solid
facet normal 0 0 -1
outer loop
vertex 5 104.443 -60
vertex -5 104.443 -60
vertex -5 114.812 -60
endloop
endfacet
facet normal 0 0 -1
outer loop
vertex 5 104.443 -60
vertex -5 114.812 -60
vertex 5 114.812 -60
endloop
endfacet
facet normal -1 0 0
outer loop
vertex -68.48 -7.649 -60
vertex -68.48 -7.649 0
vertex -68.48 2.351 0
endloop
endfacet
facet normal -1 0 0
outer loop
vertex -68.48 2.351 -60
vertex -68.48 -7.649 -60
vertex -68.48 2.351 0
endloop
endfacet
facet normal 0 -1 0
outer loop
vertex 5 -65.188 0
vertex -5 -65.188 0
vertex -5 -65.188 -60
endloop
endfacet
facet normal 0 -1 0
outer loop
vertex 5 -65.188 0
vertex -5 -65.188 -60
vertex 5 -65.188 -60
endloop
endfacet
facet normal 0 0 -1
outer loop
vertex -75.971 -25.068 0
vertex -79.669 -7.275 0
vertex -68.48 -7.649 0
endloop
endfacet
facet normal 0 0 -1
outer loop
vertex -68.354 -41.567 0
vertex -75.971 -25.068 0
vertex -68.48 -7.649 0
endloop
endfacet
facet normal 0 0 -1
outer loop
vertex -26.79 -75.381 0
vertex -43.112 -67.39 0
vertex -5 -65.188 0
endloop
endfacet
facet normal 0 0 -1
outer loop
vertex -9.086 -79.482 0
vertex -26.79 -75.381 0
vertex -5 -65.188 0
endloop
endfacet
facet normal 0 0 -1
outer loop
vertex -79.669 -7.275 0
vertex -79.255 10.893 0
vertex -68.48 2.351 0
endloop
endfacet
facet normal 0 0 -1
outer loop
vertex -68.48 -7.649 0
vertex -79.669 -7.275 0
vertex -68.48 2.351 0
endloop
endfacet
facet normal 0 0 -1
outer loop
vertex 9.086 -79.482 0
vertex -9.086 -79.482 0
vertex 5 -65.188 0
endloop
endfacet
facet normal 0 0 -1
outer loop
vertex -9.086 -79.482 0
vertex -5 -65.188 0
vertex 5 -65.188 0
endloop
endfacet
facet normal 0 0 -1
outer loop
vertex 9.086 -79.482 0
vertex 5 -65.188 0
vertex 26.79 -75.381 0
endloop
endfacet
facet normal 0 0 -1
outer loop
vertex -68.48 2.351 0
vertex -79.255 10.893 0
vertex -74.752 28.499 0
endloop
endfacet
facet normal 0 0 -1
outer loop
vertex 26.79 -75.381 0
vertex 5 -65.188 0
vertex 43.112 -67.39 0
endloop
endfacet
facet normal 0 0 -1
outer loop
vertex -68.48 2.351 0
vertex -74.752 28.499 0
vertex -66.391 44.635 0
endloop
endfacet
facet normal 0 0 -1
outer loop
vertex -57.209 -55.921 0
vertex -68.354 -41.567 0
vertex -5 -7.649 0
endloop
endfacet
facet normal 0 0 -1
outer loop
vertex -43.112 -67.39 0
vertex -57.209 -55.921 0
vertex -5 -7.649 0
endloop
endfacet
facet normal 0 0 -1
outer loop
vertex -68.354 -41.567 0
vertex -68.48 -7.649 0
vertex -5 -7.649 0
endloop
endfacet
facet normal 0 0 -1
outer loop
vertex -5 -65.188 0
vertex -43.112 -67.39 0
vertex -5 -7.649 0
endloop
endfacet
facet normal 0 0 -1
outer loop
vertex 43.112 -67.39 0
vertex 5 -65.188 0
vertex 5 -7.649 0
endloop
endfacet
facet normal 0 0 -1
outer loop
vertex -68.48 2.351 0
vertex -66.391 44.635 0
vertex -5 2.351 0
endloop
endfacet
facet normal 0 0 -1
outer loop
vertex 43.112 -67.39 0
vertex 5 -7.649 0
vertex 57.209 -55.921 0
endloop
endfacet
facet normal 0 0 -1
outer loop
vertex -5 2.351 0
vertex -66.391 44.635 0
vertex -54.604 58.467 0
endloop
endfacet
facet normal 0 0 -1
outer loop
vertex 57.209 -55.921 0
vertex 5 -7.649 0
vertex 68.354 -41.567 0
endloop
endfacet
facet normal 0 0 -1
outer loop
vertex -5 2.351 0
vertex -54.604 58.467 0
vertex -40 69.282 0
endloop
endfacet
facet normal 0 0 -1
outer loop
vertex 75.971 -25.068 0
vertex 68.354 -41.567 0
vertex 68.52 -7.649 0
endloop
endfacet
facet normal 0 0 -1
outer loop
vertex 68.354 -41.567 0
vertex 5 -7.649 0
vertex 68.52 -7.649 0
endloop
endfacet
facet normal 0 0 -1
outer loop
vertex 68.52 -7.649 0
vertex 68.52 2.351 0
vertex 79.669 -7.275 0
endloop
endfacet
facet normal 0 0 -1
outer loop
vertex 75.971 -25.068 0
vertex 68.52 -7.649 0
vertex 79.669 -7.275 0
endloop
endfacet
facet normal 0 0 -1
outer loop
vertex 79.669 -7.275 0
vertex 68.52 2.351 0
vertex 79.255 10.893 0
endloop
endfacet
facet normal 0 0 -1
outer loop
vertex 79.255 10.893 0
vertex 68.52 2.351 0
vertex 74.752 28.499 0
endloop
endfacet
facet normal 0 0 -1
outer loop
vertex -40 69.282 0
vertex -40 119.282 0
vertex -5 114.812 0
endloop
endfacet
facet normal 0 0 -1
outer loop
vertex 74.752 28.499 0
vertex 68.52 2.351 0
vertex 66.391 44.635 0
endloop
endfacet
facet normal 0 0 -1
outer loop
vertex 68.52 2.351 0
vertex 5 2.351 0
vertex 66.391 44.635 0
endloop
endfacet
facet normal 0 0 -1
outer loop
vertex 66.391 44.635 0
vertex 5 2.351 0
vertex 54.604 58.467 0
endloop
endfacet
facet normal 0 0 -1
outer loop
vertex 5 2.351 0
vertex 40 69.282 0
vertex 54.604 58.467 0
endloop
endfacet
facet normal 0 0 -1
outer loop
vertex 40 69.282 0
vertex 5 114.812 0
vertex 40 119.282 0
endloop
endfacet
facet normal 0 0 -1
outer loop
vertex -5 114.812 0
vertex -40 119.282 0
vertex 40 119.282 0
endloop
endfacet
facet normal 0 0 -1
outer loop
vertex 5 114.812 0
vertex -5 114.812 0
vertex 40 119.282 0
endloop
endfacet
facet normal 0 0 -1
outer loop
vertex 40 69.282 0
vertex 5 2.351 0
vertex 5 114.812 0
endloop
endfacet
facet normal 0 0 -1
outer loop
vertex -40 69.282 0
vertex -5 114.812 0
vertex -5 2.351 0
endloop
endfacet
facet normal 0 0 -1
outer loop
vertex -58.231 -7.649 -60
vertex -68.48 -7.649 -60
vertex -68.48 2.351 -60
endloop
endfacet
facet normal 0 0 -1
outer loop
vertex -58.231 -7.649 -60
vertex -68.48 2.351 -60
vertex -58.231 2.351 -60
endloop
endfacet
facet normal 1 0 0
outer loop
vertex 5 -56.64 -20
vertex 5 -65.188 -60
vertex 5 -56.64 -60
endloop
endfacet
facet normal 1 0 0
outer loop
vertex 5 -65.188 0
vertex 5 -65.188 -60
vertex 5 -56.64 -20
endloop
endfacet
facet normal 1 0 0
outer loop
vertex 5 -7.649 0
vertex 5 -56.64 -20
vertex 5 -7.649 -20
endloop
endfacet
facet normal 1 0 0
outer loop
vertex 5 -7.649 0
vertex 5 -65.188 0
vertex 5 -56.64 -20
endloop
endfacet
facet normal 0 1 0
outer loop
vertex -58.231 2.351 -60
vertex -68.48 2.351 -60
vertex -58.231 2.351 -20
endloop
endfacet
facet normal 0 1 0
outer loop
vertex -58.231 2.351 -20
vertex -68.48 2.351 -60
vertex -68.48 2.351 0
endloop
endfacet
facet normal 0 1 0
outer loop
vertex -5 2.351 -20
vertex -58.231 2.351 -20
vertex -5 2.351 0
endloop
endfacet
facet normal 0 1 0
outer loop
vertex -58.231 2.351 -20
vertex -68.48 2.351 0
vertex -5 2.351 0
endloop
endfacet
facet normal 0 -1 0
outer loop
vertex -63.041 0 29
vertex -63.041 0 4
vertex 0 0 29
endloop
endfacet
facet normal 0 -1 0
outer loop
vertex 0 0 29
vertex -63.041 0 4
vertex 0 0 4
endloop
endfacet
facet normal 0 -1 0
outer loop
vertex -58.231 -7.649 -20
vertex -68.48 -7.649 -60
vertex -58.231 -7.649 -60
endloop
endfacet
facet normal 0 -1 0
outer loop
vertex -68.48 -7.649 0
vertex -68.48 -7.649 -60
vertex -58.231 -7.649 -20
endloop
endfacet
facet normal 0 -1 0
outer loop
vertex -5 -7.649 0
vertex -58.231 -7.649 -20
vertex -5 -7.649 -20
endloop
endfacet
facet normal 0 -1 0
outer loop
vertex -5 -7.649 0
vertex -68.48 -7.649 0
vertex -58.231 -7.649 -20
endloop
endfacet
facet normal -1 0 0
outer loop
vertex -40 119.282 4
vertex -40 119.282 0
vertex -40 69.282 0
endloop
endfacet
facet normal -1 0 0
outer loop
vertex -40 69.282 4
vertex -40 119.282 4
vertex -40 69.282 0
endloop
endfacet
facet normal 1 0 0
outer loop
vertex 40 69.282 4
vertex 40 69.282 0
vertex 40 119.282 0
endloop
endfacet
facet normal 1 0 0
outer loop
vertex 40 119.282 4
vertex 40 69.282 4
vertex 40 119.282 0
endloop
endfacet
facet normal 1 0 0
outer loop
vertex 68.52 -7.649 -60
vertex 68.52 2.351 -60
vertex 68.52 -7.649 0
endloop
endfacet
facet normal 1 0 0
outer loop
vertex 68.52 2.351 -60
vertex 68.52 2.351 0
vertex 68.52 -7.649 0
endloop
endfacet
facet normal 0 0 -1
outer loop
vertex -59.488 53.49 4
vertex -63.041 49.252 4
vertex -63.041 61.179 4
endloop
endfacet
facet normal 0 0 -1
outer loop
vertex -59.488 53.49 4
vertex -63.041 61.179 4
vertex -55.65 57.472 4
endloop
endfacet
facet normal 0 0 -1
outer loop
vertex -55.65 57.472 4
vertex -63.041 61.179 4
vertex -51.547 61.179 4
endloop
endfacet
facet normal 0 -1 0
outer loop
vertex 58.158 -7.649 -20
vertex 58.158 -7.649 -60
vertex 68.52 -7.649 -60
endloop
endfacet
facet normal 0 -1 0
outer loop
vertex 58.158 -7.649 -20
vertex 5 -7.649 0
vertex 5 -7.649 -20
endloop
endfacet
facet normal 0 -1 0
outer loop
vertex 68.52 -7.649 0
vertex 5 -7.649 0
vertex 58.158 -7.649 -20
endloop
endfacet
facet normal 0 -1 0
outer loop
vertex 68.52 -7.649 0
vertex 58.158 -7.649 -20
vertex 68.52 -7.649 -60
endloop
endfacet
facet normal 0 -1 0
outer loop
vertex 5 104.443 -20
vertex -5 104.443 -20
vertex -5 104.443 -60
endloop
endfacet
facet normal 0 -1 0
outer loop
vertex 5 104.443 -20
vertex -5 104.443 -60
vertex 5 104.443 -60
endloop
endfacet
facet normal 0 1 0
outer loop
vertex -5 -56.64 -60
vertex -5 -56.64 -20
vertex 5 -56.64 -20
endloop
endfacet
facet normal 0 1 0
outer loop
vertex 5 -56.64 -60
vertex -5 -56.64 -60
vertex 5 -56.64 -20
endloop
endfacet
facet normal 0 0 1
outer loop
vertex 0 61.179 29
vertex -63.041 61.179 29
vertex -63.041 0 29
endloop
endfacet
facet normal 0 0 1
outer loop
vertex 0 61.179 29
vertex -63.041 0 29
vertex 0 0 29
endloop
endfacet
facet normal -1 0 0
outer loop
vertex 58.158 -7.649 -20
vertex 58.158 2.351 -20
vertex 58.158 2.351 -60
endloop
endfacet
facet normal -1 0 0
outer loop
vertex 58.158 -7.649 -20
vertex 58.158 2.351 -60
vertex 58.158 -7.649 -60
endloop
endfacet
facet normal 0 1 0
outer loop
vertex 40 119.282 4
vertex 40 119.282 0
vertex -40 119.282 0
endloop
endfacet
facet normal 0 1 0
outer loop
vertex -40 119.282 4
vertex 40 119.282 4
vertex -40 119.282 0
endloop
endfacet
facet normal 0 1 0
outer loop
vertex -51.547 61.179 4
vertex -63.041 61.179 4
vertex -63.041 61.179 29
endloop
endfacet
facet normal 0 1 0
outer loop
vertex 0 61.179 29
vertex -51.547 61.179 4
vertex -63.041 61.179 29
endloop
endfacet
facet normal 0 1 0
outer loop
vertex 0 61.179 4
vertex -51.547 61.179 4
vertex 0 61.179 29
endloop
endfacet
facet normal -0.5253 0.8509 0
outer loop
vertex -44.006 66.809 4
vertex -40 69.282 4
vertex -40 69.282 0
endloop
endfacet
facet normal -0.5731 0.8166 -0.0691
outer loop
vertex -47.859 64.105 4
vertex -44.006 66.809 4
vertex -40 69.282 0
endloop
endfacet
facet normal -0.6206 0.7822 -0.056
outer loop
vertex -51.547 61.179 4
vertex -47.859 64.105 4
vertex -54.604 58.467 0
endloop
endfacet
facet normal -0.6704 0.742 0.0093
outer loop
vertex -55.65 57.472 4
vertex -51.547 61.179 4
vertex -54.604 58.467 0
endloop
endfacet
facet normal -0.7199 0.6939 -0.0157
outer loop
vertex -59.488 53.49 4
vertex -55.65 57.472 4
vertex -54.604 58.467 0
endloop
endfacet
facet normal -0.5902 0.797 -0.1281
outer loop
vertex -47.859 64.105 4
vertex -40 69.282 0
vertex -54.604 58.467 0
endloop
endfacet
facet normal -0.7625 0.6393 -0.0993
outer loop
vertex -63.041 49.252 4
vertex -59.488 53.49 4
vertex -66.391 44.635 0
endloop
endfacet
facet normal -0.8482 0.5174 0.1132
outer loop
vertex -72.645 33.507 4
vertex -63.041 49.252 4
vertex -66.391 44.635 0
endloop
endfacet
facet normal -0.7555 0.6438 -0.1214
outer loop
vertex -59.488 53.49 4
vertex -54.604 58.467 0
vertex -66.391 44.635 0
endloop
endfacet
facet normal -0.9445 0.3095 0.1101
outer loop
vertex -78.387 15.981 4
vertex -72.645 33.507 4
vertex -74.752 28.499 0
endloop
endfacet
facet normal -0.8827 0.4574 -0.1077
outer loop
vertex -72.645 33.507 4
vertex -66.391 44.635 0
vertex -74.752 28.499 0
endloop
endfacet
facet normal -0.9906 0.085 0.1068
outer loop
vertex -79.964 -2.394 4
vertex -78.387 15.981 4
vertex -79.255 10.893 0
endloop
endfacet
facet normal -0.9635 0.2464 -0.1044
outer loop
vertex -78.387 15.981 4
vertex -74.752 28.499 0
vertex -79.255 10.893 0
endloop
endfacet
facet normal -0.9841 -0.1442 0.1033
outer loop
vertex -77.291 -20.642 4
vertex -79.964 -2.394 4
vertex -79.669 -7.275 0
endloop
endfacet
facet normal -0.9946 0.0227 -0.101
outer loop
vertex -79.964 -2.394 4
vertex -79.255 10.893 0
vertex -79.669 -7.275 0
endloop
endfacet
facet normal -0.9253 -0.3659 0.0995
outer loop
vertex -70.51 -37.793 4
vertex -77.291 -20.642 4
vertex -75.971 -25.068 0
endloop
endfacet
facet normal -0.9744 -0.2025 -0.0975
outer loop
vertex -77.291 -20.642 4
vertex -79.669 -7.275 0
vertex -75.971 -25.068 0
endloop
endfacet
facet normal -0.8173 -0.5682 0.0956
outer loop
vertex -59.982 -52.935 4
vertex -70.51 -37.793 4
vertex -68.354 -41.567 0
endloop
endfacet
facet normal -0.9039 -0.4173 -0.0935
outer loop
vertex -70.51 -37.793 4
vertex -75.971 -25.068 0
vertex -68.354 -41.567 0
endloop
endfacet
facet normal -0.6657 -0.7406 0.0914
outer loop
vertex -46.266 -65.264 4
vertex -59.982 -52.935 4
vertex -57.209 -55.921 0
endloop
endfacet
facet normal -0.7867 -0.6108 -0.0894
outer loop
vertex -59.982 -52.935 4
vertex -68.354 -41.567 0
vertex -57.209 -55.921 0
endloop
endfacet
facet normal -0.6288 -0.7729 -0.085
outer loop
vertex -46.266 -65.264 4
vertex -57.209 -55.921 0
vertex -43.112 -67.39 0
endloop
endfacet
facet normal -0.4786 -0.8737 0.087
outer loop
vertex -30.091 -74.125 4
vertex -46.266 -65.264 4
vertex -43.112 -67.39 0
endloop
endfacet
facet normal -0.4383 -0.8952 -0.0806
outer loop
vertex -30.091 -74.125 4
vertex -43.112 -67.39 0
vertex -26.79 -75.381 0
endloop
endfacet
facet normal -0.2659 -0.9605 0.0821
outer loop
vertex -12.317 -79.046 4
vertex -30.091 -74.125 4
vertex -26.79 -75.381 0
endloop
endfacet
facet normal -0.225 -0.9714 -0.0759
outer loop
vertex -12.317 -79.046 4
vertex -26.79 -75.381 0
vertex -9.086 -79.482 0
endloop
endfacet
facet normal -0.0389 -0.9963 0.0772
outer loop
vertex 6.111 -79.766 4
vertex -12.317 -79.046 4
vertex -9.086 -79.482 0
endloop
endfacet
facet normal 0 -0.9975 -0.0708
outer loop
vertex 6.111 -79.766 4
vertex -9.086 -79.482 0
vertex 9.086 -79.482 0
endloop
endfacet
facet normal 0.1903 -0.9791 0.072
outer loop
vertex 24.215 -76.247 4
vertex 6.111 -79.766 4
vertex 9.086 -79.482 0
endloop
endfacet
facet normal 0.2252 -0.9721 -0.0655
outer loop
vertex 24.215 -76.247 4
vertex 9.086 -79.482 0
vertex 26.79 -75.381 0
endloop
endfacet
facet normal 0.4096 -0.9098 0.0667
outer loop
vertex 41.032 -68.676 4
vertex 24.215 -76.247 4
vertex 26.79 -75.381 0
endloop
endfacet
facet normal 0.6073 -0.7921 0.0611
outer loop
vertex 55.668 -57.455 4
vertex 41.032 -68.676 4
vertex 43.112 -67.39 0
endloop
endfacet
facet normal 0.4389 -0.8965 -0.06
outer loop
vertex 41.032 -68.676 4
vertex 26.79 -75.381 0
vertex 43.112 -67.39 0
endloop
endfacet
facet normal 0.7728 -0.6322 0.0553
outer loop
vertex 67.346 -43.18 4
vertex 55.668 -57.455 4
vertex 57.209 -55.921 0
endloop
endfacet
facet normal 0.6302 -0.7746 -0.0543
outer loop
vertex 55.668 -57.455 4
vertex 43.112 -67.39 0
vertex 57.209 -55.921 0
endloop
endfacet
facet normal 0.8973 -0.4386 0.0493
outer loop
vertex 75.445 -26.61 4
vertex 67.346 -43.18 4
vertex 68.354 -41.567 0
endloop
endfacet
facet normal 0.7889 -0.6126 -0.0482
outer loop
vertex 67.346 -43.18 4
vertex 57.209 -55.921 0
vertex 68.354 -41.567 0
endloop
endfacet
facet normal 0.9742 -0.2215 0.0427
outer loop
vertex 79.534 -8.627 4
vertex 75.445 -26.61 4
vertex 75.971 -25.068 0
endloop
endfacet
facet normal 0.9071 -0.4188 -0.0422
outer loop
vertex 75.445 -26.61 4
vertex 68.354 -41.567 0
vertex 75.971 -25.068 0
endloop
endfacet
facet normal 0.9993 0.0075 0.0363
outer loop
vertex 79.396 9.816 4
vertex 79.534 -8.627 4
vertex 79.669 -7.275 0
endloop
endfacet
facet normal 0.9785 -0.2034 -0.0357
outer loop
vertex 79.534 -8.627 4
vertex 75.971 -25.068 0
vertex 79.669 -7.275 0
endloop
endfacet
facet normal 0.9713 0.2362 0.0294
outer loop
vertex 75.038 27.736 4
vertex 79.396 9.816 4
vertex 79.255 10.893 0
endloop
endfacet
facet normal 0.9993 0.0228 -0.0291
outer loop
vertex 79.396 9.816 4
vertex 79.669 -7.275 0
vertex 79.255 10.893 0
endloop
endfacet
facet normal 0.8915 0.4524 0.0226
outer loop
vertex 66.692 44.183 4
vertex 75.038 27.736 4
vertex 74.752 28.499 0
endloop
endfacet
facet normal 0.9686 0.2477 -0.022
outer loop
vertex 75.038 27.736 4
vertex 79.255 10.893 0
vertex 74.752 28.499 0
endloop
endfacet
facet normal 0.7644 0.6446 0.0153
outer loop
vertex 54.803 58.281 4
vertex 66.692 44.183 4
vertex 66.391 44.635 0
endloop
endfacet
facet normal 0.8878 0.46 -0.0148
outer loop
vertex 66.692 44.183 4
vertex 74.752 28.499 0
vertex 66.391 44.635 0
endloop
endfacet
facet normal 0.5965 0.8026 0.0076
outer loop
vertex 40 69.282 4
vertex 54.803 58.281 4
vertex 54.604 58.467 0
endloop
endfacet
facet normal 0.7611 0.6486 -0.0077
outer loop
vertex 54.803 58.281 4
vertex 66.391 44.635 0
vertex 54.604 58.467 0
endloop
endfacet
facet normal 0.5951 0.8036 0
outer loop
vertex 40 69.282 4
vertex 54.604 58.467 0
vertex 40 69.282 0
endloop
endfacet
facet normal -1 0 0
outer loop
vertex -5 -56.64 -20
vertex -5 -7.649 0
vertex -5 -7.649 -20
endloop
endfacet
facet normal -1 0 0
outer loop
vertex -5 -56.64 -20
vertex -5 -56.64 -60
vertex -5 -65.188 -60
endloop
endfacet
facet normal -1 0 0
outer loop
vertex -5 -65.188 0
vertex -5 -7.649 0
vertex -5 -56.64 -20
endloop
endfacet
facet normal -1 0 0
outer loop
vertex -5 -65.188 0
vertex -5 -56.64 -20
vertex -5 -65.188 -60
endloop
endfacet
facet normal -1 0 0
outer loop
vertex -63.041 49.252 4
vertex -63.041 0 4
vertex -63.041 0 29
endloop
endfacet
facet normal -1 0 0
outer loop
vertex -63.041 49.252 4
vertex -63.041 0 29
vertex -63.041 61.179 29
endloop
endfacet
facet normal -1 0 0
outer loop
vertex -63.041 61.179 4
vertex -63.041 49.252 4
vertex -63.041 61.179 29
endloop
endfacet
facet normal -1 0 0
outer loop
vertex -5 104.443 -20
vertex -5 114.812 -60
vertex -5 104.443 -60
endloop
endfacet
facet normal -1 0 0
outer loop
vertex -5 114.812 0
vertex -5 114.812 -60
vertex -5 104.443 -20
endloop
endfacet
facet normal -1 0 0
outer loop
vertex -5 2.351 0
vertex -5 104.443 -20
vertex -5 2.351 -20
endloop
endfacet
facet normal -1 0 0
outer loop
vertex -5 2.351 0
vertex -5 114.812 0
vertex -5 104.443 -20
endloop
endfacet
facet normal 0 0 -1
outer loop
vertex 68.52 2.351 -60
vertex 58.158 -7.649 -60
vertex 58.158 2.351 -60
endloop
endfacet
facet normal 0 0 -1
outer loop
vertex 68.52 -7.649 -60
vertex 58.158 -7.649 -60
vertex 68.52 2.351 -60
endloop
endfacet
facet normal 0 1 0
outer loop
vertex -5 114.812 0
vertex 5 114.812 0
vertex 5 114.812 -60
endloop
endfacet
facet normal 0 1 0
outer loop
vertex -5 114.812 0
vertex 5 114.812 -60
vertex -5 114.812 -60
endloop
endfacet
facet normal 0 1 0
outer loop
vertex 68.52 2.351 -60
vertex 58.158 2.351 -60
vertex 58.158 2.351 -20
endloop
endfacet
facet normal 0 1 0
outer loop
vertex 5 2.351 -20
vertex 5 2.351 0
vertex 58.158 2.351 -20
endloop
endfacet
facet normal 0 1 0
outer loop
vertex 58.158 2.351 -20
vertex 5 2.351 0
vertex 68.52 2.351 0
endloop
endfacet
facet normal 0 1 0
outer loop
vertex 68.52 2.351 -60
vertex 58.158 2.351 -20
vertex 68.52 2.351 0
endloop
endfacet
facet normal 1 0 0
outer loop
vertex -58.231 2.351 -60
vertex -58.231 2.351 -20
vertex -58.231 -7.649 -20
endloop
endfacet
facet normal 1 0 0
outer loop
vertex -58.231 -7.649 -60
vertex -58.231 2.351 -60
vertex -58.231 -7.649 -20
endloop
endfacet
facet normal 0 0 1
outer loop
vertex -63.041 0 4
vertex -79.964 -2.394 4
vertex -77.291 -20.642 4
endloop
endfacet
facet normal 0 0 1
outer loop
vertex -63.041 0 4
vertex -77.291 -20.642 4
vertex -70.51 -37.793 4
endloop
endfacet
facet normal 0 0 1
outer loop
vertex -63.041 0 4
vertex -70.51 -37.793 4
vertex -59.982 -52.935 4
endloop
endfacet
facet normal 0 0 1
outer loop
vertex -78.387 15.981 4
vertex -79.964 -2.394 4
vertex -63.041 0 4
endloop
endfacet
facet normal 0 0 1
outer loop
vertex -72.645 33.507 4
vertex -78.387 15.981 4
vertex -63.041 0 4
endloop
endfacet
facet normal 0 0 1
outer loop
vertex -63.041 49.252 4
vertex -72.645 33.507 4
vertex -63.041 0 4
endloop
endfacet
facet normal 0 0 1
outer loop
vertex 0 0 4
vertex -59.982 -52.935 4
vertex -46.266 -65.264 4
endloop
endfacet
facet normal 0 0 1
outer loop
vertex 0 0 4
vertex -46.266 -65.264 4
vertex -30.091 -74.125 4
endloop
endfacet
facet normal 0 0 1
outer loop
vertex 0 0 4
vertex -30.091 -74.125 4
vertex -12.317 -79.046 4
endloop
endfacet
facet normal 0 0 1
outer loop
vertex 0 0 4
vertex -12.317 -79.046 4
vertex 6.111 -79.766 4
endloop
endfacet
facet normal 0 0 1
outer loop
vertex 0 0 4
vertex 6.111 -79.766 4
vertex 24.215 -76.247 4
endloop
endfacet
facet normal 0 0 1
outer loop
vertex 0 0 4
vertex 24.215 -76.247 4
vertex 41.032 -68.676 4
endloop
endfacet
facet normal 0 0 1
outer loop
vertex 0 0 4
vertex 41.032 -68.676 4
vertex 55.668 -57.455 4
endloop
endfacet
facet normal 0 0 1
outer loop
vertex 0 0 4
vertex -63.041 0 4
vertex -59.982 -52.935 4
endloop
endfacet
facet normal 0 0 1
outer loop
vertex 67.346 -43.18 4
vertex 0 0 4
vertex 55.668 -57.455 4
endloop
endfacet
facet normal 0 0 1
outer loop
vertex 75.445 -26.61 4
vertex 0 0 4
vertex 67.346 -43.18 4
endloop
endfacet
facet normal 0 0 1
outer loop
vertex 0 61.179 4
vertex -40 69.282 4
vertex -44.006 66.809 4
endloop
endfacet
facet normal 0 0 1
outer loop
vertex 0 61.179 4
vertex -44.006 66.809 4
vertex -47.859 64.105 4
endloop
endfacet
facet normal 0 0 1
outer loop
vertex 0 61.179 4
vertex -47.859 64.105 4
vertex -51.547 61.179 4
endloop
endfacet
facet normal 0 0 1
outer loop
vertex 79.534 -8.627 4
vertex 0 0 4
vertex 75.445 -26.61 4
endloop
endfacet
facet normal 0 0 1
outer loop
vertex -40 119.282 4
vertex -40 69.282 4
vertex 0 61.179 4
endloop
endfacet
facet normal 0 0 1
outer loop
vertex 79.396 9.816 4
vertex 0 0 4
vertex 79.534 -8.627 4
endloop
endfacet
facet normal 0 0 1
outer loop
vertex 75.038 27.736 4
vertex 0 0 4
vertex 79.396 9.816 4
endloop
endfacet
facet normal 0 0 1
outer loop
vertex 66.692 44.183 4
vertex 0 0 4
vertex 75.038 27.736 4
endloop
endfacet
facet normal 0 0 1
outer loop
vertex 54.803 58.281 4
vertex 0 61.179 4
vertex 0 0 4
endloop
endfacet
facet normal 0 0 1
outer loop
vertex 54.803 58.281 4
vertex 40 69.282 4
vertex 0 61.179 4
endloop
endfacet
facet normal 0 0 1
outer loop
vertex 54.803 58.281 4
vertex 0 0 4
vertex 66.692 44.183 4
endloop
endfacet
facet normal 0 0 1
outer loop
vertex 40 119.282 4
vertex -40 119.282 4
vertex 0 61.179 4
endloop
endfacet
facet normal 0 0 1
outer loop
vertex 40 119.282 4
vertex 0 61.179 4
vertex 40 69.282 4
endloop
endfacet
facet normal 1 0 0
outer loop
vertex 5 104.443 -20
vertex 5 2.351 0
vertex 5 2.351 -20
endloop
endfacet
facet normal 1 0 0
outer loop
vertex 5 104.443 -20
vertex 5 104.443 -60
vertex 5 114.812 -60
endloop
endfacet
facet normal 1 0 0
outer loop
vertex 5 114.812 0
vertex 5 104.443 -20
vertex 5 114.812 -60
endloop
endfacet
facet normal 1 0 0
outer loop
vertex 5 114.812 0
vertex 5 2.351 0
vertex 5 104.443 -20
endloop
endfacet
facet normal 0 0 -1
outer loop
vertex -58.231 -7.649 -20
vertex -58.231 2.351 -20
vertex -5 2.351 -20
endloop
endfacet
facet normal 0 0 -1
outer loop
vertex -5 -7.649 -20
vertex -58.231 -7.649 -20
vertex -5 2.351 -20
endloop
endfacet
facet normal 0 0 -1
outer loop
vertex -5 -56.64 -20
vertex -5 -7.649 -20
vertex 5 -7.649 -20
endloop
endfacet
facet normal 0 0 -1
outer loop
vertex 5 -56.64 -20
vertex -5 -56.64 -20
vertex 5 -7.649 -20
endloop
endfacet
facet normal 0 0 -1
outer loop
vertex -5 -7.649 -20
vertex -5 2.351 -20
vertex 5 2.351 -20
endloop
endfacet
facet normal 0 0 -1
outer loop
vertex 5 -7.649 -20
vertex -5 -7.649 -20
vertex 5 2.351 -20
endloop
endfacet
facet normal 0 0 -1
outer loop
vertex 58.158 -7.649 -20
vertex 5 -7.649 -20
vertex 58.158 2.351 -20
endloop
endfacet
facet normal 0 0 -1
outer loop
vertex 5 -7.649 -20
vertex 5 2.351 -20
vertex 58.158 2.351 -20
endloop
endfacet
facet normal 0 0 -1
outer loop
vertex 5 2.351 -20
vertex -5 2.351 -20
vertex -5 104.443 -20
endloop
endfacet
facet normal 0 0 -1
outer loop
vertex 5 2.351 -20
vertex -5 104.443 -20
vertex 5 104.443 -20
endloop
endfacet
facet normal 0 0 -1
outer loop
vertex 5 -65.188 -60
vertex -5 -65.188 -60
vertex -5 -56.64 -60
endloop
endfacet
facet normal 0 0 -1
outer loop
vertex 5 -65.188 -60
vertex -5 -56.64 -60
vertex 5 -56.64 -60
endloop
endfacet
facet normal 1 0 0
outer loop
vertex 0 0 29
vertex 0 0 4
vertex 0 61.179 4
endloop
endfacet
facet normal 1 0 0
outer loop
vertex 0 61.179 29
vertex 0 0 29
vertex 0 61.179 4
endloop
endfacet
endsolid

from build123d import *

# Parameters (mm, degrees)
F2_DEPTH = 4
F3_W     = 63.5204769373
F3_H     = 10
F3_W_2   = 10
F3_W_3   = 63.4795230627
F4_DEPTH = 20
F5_W     = 10.3620196581
F5_H     = 10
F5_W_2   = 10.2485753596
F5_W_3   = 10
F5_H_2   = 8.5477627644
F5_H_3   = 10.3687997332
F6_DEPTH = 40
F7_W     = 63.041254878
F7_H     = 61.1792467535
F8_DEPTH = 25


with BuildPart() as f2:
    # F0 (on Top) → F2 (new body)
    with BuildSketch(Plane.XY):
        with BuildLine():
            Line((-40, 119.2820323028), (-40, 69.2820323028))
            ThreePointArc((-40, 69.2820323028), (0, -80), (40, 69.2820323028))
            Line((40, 69.2820323028), (40, 119.2820323028))
            Line((40, 119.2820323028), (-40, 119.2820323028))
        make_face()
    extrude(amount=F2_DEPTH)

    # F3 (on face) → F4 (join)
    with BuildSketch(Plane.XY):
        Polygon((5, 114.8120965233), (0, 114.8120965233), (-5, 114.8120965233), (-5, 2.3505634069), (5, 2.3505634069), align=None)
        with Locations((36.7602384686, -2.6494365931)):
            Rectangle(F3_W, F3_H)
        with Locations((0, -2.6494365931)):
            Rectangle(F3_W_2, F3_H)
        with Locations((-36.7397615314, -2.6494365931)):
            Rectangle(F3_W_3, F3_H)
        Polygon((5, -65.1879034767), (5, -7.6494365931), (-5, -7.6494365931), (-5, -65.1879034767), (0, -65.1879034767), align=None)
    extrude(amount=-F4_DEPTH)

    # F5 (on face) → F6 (join)
    with BuildSketch(Plane(origin=(0, 0, -20), x_dir=(1, 0, 0), z_dir=(0, 0, -1))):
        with Locations((63.3394671082, 2.6494365931)):
            Rectangle(F5_W, F5_H)
        with Locations((-63.3552353829, 2.6494365931)):
            Rectangle(F5_W_2, F5_H)
        with Locations((0, 60.9140220945)):
            Rectangle(F5_W_3, F5_H_2)
        with Locations((0, -109.6276966567)):
            Rectangle(F5_W_3, F5_H_3)
    extrude(amount=F6_DEPTH)

    # F7 (on face) → F8 (join)
    with BuildSketch(Plane.XY.offset(4)):
        with Locations((-31.520627439, 30.5896233767)):
            Rectangle(F7_W, F7_H)
    extrude(amount=F8_DEPTH)


solid = f2.part
